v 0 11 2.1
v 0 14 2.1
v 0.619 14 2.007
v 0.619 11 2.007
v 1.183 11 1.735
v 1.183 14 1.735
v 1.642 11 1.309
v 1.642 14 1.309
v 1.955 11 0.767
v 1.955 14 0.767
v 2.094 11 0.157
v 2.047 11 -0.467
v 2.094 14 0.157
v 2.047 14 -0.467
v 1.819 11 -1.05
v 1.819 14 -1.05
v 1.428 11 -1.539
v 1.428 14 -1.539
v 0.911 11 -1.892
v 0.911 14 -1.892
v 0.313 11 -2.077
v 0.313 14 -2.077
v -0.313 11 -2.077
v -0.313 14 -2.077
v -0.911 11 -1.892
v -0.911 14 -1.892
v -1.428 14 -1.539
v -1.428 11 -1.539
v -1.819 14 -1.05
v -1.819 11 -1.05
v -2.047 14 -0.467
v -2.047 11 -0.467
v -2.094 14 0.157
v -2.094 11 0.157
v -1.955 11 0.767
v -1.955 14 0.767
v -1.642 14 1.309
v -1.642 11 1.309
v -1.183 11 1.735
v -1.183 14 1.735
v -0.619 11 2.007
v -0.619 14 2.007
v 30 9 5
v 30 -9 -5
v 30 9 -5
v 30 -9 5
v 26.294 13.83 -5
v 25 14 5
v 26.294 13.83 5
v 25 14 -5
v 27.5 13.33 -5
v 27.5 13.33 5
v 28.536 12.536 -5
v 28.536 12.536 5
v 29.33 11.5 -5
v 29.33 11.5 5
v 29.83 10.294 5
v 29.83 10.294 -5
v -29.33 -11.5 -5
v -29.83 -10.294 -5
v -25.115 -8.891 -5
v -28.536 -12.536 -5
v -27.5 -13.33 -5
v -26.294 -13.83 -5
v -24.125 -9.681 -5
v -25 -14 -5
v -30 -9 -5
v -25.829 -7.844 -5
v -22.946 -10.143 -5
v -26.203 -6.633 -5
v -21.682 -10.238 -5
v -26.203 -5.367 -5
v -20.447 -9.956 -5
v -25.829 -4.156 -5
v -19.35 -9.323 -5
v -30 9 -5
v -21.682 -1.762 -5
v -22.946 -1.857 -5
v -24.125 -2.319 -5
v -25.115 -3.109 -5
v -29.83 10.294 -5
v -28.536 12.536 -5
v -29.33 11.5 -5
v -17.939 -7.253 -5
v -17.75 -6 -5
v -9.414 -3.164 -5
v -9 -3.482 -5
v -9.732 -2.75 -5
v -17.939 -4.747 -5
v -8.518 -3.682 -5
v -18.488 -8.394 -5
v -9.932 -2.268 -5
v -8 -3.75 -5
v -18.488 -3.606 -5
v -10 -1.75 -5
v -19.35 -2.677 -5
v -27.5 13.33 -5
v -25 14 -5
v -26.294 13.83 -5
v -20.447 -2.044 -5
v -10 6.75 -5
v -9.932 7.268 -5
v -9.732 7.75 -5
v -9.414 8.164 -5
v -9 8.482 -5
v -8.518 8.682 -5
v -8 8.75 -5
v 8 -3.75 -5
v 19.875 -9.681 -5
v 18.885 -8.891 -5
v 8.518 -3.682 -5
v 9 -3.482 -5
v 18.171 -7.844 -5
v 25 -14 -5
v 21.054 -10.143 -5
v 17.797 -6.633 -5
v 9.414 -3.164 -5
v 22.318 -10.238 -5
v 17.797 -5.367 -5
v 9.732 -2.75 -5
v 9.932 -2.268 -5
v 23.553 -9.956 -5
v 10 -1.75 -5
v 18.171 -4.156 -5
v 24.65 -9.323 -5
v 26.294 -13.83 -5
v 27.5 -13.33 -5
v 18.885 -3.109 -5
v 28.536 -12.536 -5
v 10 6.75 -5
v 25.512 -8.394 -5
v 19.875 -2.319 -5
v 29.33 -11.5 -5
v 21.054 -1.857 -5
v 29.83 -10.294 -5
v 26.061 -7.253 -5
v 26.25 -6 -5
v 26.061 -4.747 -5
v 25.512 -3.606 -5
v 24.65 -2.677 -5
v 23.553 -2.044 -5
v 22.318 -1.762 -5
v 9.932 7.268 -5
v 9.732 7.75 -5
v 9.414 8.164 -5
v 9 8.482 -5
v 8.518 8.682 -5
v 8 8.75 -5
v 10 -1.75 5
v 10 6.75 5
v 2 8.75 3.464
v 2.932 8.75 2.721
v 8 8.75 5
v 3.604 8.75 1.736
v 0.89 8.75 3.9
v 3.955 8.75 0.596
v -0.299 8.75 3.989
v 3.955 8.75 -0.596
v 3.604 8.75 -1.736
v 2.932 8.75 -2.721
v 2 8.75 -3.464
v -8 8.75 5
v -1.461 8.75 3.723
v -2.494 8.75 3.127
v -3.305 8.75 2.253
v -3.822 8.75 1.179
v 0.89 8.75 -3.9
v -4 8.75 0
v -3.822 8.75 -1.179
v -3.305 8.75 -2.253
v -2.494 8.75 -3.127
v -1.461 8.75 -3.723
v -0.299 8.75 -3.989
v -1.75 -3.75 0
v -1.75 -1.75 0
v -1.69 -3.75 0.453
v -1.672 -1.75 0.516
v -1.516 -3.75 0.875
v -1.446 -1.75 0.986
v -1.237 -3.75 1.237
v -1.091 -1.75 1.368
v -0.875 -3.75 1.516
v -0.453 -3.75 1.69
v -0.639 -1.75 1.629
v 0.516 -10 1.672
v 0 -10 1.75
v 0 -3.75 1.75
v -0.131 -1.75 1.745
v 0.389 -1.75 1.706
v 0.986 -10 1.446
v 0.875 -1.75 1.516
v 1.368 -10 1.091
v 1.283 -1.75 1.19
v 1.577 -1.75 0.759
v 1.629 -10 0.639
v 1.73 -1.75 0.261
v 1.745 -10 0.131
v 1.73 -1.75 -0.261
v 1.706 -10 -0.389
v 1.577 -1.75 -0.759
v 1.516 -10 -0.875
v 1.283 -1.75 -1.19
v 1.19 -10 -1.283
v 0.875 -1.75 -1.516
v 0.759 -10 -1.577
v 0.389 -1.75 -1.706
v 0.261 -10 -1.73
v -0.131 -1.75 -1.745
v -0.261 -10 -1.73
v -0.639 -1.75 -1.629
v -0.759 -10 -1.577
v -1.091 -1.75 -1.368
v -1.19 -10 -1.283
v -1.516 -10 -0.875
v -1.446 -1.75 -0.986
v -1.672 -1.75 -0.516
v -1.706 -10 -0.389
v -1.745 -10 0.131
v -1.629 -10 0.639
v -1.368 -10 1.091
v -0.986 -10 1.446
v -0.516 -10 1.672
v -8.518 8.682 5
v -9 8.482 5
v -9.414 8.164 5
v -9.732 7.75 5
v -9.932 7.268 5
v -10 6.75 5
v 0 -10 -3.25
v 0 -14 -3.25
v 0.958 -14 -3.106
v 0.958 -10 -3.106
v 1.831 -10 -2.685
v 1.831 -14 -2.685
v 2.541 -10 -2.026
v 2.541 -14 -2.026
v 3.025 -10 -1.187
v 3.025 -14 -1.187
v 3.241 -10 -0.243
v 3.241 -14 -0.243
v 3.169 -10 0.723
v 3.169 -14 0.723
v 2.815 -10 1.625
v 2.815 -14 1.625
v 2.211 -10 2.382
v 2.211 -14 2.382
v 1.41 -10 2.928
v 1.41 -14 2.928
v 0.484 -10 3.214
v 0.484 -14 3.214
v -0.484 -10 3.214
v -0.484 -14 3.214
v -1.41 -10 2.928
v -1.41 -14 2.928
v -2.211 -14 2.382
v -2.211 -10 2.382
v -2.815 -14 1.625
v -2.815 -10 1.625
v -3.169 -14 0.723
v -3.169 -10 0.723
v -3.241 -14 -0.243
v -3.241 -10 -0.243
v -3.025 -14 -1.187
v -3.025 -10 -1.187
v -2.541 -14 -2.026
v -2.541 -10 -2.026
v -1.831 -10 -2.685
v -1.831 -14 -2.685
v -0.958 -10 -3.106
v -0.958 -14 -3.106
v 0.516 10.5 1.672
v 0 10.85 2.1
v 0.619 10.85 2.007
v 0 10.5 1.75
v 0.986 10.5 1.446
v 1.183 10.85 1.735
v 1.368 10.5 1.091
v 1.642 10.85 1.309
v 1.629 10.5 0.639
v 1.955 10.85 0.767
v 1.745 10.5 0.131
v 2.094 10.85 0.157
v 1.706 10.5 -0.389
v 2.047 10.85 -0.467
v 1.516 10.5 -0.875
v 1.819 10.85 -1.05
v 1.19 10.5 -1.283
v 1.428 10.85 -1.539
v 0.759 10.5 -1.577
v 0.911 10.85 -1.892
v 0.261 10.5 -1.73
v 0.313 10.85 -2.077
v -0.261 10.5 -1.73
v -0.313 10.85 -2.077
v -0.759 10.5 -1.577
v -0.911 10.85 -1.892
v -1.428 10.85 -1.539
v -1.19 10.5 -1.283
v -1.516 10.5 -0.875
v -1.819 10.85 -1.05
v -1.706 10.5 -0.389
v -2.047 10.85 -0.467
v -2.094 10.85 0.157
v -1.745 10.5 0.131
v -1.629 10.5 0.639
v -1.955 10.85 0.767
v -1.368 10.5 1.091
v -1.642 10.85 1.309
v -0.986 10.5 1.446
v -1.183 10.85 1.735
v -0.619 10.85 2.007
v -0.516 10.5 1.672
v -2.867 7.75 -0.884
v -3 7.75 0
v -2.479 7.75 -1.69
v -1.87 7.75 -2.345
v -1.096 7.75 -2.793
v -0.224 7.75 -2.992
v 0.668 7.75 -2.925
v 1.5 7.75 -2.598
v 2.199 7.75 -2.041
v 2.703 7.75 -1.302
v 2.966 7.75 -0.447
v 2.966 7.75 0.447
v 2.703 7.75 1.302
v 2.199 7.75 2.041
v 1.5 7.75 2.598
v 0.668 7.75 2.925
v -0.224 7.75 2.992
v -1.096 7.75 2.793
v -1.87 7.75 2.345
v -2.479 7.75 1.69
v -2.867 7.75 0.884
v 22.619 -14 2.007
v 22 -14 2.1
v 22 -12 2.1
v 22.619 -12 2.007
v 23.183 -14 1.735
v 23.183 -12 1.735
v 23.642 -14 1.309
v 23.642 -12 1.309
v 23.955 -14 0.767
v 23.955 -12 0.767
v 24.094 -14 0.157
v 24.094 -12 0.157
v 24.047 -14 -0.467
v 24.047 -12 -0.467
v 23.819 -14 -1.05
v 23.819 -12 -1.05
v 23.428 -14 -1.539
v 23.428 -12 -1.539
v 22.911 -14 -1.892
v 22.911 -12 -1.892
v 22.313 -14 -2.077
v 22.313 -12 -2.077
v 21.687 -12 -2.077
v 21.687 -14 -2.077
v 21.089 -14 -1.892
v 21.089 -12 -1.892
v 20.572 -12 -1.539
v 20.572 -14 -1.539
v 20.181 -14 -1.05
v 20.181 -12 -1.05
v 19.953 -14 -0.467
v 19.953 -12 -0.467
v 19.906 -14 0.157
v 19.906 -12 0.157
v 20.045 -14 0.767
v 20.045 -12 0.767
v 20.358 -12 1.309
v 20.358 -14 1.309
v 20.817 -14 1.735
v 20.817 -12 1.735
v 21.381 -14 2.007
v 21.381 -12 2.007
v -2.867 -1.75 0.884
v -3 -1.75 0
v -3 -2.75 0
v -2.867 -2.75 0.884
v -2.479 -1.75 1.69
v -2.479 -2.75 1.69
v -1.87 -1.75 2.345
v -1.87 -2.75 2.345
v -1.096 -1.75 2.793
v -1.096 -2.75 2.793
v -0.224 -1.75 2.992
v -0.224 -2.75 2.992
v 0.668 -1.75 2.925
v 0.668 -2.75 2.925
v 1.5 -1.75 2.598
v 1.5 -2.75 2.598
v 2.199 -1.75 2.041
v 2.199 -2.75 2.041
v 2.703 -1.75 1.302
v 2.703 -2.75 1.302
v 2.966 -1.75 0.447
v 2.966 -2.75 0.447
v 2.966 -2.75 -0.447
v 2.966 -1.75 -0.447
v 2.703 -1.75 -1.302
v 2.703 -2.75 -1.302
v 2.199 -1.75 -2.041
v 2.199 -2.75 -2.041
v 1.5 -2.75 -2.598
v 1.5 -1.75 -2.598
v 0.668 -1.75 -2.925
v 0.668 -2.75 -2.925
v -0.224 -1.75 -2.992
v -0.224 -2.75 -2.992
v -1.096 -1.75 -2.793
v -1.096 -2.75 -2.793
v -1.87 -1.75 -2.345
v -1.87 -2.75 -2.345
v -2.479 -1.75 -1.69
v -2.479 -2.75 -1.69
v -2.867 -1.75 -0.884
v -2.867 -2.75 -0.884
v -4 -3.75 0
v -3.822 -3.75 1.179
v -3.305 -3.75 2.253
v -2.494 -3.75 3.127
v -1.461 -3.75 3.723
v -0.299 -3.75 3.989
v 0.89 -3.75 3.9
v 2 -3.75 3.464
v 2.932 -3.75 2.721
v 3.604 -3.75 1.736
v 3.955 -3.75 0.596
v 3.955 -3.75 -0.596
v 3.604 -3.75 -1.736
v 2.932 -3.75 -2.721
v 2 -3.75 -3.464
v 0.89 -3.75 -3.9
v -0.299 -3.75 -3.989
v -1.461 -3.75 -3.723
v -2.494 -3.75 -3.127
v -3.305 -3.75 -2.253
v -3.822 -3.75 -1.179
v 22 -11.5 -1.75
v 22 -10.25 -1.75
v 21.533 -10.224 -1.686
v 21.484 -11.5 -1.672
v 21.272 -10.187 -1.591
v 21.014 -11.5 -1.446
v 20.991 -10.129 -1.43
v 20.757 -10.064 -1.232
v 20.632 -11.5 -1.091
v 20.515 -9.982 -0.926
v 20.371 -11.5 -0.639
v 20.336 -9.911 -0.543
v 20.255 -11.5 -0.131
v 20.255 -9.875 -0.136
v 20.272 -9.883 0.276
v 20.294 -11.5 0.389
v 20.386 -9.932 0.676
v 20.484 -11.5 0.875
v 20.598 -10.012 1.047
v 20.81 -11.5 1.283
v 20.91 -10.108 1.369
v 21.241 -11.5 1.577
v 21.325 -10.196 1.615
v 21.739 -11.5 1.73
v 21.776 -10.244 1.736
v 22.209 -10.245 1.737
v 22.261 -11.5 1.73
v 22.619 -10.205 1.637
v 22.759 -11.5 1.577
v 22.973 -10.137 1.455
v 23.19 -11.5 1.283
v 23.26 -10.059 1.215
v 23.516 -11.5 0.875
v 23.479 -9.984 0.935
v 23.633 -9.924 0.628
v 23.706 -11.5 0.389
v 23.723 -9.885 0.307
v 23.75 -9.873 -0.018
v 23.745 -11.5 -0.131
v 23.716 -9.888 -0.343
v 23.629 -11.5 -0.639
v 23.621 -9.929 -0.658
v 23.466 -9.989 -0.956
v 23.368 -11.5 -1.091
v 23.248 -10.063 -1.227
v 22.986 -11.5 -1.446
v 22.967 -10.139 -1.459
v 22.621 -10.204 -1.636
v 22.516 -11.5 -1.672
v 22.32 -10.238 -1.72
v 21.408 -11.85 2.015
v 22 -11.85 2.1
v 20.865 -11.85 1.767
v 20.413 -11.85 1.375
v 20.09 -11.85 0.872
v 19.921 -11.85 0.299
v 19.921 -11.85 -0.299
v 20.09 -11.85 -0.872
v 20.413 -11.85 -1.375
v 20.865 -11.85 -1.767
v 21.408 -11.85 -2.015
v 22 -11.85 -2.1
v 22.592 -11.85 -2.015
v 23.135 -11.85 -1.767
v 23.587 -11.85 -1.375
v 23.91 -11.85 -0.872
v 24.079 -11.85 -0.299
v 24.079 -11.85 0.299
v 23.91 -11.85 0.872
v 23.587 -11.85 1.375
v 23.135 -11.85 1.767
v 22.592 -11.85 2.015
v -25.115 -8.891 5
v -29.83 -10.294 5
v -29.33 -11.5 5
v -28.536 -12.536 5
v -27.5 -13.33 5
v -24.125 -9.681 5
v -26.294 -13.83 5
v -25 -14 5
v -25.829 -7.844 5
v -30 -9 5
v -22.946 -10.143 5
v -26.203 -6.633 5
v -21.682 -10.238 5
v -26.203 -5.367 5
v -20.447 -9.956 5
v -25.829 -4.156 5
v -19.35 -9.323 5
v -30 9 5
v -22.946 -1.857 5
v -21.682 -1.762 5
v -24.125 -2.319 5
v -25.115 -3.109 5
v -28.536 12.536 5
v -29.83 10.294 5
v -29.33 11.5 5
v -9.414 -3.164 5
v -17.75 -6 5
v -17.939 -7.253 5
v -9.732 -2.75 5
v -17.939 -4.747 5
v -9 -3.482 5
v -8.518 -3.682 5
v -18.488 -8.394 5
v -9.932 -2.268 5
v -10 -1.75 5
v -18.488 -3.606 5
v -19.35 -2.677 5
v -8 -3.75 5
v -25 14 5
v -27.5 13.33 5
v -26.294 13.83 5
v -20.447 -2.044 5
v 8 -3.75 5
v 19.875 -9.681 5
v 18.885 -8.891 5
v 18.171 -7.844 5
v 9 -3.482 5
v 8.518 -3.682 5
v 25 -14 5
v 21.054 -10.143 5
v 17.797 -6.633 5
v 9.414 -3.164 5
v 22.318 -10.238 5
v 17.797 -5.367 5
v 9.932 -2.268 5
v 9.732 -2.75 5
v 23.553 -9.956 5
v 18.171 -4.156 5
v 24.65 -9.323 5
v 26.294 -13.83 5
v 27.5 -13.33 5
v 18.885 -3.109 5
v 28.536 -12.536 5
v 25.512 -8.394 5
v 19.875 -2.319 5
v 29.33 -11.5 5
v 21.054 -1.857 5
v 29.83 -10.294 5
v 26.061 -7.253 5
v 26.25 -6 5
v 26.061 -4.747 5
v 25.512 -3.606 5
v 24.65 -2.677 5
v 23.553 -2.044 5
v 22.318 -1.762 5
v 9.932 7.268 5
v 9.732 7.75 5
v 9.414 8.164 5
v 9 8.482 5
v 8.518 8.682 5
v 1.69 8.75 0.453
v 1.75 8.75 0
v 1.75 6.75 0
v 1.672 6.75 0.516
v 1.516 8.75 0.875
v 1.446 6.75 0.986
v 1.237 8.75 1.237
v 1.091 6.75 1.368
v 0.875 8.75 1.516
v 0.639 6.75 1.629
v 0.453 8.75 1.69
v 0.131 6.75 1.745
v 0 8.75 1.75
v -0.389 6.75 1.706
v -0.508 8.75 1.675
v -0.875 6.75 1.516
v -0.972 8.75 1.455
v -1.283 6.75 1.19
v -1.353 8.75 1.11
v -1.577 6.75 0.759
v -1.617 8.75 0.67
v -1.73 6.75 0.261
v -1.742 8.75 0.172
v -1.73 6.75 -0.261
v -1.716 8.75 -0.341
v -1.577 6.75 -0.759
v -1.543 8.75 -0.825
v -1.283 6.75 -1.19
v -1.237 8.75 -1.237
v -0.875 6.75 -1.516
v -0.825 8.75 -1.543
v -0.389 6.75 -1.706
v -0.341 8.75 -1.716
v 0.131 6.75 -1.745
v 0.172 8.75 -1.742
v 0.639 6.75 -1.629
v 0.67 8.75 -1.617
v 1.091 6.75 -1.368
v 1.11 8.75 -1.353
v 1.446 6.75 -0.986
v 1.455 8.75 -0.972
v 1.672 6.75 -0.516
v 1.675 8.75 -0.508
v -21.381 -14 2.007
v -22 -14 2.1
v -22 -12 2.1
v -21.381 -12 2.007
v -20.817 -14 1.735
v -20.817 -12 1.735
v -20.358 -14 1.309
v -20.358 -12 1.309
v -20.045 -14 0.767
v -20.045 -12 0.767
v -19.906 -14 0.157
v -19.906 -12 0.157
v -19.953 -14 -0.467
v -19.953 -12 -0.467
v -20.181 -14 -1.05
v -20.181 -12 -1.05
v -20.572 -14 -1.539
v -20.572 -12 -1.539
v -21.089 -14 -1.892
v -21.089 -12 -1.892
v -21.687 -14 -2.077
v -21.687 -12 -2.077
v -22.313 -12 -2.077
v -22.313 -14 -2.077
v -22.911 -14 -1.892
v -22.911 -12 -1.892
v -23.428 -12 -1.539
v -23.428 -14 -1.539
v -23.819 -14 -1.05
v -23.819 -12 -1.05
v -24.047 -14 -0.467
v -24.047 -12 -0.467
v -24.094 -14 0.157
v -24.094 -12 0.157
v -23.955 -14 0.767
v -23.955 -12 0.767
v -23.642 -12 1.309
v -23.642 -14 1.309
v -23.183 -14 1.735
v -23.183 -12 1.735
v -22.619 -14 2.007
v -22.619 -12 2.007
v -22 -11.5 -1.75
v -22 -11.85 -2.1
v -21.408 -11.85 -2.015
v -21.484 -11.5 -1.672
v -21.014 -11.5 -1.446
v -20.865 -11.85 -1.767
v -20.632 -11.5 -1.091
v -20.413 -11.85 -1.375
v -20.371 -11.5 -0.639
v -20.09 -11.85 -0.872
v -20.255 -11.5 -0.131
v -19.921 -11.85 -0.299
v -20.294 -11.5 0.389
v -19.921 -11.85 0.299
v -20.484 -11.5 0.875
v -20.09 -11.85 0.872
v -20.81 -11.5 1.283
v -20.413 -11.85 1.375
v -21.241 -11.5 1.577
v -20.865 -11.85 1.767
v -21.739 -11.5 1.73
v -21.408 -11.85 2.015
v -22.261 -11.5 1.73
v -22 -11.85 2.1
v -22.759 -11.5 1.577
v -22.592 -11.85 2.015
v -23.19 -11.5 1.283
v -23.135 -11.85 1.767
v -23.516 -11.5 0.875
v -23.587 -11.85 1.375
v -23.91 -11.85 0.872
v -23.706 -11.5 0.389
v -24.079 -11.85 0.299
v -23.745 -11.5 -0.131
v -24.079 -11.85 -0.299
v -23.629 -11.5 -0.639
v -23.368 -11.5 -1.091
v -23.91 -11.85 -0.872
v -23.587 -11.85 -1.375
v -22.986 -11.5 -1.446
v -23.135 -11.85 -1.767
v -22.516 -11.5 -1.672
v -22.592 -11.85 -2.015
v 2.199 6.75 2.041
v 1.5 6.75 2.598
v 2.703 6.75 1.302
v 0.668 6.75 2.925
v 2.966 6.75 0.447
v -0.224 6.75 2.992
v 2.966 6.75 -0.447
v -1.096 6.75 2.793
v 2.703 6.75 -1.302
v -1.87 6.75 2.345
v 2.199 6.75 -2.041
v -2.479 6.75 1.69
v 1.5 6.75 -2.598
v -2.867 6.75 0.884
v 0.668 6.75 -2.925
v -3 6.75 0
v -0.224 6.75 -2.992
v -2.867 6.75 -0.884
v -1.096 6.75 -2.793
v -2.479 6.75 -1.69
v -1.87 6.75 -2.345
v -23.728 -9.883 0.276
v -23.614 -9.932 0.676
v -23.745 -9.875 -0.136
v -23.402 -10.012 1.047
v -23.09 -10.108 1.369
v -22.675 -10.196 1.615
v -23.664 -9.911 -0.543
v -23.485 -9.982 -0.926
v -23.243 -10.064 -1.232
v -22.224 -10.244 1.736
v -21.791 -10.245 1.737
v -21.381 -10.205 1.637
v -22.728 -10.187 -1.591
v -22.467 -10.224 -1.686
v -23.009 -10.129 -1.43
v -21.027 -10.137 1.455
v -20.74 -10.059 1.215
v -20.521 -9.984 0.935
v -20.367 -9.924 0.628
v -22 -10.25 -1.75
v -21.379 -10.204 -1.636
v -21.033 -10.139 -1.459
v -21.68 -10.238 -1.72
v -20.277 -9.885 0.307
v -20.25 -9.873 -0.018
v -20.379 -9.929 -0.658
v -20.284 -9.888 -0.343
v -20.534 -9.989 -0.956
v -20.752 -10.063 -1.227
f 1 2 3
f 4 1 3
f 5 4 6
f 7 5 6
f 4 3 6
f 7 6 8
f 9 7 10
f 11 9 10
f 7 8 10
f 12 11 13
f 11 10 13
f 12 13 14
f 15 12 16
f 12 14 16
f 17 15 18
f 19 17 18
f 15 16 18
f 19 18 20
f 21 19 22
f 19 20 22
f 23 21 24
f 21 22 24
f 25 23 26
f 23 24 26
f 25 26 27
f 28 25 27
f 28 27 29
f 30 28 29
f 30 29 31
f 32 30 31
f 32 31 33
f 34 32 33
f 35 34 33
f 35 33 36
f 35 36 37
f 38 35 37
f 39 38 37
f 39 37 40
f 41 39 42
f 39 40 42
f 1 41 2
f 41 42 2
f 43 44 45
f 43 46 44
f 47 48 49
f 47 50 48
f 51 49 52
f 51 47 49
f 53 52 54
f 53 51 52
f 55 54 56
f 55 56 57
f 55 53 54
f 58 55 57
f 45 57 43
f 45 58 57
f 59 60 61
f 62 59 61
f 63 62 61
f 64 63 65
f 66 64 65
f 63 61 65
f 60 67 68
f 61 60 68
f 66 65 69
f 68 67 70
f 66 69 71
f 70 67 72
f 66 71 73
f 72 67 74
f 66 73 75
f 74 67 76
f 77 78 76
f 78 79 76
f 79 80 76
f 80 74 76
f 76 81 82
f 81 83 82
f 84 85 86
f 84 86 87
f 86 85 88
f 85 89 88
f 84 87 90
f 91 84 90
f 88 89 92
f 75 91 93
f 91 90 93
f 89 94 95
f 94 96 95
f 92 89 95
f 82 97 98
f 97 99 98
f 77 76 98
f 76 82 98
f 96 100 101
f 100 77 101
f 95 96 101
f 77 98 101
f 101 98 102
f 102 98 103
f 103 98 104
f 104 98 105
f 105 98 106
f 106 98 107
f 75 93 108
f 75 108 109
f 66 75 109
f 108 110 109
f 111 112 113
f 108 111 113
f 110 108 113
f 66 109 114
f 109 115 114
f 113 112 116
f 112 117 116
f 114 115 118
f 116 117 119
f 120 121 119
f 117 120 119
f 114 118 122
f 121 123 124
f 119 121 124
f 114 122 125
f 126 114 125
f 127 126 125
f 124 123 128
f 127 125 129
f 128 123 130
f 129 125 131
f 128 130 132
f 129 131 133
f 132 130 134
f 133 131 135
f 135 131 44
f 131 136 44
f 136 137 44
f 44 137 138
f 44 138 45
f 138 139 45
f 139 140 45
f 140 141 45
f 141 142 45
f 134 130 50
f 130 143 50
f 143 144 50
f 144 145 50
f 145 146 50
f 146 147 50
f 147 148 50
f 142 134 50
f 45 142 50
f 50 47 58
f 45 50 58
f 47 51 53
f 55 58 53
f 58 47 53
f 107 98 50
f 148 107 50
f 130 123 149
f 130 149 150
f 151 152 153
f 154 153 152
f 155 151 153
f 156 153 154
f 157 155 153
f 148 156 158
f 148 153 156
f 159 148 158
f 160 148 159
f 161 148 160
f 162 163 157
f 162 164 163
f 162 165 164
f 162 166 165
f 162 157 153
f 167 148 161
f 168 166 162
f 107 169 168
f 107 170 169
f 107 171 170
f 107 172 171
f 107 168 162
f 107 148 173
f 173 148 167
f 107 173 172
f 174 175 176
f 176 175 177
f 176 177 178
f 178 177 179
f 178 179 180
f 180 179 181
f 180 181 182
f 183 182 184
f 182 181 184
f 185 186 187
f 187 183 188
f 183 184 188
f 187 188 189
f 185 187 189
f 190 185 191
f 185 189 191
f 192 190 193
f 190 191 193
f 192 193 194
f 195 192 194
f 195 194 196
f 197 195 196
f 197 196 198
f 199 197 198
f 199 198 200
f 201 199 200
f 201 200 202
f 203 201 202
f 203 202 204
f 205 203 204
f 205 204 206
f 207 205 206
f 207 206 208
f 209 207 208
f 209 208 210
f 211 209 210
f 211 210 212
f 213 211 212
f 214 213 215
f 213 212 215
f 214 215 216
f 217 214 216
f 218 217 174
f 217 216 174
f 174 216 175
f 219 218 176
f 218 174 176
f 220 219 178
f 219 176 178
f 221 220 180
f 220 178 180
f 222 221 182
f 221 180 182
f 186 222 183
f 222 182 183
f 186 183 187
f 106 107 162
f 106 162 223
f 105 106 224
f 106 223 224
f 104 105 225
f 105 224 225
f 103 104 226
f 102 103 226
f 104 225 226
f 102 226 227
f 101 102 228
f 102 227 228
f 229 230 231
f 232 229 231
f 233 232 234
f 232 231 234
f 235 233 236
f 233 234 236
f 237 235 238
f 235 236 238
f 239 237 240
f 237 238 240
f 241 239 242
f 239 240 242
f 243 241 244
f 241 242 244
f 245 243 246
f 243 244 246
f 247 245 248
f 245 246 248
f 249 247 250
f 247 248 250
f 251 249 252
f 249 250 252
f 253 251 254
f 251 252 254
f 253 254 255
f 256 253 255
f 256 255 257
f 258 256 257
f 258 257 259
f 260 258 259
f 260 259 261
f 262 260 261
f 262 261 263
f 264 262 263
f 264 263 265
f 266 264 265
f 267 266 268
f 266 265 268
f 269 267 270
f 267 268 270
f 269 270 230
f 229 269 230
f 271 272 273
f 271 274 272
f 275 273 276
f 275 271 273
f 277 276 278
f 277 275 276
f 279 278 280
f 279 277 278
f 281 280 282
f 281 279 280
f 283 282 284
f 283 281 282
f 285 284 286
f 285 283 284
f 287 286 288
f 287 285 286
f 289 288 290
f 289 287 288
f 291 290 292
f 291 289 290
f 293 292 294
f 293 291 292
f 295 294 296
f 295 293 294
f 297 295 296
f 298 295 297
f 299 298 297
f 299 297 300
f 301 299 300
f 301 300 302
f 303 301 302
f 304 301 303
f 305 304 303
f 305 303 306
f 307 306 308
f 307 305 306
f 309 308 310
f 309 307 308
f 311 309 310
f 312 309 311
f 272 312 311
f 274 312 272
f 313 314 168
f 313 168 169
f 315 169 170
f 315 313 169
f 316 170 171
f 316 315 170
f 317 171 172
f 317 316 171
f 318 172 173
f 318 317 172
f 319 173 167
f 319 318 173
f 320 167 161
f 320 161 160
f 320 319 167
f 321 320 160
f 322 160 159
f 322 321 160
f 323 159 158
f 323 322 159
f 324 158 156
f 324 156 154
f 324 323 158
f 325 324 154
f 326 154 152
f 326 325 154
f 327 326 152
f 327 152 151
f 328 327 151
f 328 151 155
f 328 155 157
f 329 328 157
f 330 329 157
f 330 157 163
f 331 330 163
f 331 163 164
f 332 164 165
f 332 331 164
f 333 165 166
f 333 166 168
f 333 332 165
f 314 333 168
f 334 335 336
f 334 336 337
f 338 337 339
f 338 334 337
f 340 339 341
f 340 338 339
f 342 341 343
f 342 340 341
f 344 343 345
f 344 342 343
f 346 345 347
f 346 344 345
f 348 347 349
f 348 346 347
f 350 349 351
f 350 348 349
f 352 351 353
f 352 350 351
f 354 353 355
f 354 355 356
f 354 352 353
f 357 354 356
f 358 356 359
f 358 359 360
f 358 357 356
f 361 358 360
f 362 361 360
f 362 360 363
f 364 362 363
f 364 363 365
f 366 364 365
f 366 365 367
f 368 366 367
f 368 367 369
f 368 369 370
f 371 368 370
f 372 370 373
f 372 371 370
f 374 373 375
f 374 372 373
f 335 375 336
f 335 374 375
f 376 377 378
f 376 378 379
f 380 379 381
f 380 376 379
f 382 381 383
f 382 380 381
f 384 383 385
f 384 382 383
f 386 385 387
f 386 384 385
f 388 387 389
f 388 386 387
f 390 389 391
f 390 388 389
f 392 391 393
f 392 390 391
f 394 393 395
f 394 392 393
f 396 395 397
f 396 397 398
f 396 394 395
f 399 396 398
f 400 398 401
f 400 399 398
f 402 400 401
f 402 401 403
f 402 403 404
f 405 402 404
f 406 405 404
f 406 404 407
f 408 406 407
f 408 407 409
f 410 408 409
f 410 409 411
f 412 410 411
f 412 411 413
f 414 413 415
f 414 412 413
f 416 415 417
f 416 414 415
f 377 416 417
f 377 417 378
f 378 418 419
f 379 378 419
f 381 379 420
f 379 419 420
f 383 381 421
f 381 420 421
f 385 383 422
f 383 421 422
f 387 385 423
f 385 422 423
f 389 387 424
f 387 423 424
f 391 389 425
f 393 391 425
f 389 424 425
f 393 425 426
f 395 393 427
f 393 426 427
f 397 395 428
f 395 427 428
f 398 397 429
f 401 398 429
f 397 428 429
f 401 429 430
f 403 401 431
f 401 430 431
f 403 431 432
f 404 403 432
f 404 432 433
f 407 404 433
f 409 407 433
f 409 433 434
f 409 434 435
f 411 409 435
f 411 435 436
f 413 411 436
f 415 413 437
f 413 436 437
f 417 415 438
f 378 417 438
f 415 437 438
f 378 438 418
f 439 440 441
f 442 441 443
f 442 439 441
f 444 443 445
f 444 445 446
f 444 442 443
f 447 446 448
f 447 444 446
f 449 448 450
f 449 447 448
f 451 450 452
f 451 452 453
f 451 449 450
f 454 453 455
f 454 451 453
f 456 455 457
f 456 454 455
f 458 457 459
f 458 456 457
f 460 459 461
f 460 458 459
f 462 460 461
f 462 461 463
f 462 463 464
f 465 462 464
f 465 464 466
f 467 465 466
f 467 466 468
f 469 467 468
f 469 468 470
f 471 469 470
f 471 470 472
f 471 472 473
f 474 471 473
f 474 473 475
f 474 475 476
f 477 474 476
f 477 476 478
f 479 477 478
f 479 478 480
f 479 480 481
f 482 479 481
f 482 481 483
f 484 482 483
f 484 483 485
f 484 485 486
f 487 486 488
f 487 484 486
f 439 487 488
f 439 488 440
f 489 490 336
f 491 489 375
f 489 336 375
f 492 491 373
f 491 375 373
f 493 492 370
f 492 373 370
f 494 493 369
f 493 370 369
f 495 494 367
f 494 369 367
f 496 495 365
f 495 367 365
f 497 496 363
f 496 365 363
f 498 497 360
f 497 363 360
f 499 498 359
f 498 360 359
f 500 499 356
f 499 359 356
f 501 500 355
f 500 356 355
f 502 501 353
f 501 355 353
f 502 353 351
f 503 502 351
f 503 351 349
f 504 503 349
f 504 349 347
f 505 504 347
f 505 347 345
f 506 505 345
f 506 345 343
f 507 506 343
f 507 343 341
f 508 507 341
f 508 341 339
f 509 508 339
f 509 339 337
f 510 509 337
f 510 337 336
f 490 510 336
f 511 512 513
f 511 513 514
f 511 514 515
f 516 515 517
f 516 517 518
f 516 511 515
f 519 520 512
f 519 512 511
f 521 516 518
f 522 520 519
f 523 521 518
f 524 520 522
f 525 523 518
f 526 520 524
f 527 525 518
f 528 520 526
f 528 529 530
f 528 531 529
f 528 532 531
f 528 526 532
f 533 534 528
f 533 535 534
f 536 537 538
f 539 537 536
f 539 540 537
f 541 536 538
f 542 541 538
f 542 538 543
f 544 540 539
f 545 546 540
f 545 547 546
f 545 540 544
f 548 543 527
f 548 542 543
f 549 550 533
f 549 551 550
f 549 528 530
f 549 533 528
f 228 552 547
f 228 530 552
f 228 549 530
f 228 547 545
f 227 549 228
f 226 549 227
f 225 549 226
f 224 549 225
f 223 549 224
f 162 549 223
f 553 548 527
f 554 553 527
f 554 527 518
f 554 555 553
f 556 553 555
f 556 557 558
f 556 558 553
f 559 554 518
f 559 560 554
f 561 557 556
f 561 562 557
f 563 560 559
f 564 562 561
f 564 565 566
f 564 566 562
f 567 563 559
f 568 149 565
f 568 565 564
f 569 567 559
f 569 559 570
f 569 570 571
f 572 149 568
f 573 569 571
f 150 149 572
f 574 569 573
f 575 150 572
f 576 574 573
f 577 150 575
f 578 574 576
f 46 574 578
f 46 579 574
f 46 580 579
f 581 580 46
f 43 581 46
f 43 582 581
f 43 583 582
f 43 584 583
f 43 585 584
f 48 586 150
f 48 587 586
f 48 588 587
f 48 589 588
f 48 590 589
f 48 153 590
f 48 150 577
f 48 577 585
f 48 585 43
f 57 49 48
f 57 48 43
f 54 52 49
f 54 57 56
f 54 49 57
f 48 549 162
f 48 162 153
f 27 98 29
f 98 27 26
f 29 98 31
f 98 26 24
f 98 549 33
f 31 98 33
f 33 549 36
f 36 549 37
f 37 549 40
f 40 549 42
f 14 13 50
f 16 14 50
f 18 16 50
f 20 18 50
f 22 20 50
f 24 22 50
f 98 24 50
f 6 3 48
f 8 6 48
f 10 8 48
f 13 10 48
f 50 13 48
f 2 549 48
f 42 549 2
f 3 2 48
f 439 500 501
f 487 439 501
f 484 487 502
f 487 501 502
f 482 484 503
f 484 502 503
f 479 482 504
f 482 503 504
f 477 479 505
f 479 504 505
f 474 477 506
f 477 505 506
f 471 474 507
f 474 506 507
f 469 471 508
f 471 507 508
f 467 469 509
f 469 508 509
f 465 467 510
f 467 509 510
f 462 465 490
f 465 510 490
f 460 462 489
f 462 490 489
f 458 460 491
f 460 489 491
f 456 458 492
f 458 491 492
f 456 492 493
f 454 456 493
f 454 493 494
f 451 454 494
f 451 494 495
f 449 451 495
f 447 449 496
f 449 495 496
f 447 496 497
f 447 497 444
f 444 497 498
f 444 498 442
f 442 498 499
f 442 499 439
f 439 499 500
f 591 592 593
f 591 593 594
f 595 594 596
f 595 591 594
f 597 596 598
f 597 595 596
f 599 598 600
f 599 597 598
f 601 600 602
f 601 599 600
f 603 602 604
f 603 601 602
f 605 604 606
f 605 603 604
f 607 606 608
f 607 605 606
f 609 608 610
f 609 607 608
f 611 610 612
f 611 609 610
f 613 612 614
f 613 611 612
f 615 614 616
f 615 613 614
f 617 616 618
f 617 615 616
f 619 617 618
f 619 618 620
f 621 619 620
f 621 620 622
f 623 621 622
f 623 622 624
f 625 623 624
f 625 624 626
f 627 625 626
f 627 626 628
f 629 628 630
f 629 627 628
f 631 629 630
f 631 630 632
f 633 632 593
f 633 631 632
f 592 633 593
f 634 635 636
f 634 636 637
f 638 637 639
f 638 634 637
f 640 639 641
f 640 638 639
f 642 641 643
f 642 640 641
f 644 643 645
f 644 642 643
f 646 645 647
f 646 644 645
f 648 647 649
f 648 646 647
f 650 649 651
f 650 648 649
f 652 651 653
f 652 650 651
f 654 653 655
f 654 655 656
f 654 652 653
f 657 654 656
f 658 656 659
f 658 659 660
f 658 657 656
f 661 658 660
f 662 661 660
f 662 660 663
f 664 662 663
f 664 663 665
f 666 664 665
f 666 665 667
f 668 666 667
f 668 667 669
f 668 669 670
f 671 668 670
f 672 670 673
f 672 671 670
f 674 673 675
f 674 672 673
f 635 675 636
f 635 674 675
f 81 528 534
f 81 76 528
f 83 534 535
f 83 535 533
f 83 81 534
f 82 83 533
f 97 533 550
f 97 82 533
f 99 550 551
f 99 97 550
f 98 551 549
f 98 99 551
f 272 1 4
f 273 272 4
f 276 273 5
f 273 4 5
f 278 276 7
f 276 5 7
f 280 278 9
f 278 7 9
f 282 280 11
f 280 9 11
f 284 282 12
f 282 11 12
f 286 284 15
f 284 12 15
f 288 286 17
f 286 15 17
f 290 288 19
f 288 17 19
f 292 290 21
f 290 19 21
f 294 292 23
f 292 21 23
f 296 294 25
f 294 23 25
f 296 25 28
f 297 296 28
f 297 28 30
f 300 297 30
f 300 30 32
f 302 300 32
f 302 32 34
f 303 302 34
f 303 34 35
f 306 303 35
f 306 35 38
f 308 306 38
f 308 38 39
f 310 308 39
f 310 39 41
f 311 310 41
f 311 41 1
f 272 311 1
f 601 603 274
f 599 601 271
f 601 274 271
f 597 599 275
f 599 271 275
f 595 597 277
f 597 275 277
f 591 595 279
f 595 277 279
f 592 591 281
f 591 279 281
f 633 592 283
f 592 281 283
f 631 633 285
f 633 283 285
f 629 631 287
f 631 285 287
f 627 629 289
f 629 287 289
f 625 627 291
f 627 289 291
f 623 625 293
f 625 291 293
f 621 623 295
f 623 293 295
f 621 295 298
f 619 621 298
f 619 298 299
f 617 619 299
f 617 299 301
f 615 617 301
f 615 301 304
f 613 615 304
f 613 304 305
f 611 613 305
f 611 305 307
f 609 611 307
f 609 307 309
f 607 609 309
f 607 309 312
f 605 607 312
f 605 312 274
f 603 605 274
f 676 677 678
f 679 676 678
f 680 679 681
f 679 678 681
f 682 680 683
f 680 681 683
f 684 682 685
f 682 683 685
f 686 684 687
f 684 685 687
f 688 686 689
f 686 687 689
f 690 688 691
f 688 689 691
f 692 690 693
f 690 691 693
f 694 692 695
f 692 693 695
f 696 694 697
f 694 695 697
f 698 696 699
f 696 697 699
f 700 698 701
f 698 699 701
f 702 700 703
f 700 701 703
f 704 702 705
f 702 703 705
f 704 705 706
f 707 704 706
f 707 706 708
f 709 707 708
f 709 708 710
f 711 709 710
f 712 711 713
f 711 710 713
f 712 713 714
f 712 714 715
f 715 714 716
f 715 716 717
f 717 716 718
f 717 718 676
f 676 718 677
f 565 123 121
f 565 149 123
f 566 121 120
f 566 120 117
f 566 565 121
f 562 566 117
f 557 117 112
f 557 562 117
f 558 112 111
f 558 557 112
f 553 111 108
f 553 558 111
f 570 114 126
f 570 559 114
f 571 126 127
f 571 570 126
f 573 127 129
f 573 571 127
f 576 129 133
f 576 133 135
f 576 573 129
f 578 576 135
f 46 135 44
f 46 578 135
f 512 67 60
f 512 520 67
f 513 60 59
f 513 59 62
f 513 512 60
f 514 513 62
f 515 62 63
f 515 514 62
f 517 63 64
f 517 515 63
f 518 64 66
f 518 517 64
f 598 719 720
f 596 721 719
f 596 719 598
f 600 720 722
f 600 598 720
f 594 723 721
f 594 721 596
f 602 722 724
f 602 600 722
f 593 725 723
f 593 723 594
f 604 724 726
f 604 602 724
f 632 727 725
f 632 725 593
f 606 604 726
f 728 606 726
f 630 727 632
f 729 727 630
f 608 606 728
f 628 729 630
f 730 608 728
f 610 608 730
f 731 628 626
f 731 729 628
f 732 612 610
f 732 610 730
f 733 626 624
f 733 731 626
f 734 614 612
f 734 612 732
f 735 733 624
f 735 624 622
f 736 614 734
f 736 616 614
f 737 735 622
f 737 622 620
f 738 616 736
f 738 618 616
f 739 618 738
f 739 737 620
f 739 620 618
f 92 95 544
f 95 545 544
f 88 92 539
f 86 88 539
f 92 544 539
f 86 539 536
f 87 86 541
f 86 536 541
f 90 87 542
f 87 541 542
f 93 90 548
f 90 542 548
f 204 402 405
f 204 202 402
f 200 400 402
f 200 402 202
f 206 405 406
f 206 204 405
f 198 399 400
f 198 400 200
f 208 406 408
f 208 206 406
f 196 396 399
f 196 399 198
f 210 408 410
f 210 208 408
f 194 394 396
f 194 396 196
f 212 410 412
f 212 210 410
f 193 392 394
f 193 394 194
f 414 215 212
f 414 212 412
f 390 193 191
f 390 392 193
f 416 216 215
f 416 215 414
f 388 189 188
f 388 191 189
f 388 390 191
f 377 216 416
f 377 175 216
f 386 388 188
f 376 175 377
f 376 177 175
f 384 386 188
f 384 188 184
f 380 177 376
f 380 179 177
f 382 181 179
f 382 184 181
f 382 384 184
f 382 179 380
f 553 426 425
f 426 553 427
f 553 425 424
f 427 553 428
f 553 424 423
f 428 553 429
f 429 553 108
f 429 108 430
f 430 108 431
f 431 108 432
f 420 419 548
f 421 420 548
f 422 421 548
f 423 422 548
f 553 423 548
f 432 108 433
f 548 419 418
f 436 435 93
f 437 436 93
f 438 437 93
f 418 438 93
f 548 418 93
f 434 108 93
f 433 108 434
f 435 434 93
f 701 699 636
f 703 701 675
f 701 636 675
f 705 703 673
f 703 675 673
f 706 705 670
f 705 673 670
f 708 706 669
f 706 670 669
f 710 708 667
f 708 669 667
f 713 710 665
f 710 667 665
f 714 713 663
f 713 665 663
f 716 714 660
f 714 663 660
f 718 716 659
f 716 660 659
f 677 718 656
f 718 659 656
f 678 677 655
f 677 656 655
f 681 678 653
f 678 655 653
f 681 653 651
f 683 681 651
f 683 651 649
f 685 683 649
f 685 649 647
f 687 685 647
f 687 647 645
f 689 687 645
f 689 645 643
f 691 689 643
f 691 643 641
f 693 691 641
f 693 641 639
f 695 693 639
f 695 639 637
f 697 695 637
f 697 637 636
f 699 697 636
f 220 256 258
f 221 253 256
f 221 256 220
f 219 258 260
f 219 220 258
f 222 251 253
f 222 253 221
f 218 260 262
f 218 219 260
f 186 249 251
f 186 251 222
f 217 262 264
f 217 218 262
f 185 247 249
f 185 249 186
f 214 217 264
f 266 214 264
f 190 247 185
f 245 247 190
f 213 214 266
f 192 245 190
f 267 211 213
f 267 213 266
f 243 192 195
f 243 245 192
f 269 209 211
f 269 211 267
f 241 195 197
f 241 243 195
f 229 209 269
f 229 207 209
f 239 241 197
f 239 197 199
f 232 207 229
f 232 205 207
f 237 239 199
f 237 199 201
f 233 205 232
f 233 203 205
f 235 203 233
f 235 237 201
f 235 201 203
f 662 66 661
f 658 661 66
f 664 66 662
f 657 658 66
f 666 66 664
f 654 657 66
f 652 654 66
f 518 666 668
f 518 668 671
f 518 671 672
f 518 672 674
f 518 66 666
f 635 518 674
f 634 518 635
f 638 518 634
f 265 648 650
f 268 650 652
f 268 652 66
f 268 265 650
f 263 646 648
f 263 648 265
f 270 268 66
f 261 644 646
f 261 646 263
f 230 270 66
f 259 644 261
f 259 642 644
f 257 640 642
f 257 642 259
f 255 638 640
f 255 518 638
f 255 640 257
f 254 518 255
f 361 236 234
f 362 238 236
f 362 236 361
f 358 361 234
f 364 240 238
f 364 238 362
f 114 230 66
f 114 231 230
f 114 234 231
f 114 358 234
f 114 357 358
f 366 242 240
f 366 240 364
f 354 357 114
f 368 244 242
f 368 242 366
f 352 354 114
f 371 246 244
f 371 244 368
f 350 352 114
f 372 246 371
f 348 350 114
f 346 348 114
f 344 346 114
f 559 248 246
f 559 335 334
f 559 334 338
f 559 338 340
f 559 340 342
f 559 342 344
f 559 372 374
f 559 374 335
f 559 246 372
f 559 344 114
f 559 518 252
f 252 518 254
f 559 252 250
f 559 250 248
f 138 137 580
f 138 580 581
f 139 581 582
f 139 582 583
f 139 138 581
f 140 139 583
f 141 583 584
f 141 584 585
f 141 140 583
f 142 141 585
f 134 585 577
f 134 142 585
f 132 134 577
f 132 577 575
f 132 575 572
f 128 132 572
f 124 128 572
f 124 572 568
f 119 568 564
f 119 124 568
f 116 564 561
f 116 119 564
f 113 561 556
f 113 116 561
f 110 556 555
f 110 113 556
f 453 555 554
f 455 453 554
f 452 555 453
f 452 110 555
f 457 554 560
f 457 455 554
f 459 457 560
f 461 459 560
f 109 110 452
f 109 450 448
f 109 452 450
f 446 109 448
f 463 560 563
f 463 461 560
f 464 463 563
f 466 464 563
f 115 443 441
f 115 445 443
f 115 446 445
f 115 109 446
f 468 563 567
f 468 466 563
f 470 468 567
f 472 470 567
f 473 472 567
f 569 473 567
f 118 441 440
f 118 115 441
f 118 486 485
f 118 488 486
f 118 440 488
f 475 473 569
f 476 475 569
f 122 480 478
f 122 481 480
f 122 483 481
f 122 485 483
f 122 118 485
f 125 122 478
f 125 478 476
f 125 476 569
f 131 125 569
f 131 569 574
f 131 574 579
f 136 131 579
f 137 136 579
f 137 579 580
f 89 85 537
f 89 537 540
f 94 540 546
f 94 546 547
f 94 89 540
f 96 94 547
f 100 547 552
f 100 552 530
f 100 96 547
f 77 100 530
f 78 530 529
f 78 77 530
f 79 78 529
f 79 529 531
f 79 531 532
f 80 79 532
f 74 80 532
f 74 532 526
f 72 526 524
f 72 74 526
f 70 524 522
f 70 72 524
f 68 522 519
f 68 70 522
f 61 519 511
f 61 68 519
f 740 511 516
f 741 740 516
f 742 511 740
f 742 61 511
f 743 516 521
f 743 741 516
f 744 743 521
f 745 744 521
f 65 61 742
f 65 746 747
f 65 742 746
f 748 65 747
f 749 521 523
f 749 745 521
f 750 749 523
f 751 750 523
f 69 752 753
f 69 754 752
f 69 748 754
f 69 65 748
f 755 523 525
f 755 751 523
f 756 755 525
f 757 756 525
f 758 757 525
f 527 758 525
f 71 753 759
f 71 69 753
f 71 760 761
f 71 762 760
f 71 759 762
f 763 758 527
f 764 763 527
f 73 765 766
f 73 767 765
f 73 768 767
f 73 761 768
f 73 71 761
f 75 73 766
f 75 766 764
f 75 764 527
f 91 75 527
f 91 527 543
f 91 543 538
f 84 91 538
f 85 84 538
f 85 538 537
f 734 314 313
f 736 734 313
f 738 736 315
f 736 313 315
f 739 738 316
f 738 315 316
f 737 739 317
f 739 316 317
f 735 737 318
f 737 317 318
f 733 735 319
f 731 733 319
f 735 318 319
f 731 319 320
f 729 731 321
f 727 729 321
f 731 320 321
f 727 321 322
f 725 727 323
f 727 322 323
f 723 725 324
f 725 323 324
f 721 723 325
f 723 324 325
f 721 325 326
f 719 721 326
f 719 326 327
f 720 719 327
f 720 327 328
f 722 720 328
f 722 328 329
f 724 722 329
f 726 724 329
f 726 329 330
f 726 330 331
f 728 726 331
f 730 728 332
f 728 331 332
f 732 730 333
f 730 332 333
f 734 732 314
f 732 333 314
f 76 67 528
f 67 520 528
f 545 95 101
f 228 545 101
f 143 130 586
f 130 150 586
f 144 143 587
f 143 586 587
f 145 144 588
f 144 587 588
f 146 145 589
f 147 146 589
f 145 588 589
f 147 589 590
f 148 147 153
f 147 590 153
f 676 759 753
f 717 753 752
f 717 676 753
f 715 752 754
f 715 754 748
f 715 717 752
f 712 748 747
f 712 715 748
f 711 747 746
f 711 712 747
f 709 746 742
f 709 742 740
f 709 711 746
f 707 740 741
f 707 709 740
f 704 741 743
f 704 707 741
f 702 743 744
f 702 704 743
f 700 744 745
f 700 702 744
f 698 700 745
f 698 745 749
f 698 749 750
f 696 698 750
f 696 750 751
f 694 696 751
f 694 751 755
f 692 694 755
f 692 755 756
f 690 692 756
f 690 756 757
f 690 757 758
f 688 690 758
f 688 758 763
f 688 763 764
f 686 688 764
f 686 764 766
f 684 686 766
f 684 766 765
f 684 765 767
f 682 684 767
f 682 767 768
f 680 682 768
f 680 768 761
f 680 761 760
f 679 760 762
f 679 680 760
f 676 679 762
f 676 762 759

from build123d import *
from build123d.topology import SkipClean

# Parameters (mm, degrees)
SKETCH1_W           = 60
SKETCH1_H           = 28
SKETCH1_R           = 4.25
BOSS_EXTRUDE1_DEPTH = 5
SKETCH2_W           = 20
SKETCH2_H           = 12.5
CUT_EXTRUDE1_DEPTH  = 35.583232932
SKETCH3_R           = 1.75
CUT_EXTRUDE2_DEPTH  = 30
CUT_EXTRUDE3_REACH  = 43.34
SKETCH4_R           = 1.75
FILLET1_R           = 5
FILLET2_R           = 2
SKETCH5_R           = 3.25
CUT_EXTRUDE4_DEPTH  = 4
SKETCH6_R           = 2.1
CUT_EXTRUDE5_DEPTH  = 2
SKETCH7_R           = 3
SKETCH7_R_2         = 1.75
BOSS_EXTRUDE2_DEPTH = 2
BOSS_EXTRUDE3_START = 2
SKETCH8_R           = 3
SKETCH8_R_2         = 1.75
BOSS_EXTRUDE3_DEPTH = 2
SKETCH9_R           = 2.1
CUT_EXTRUDE6_DEPTH  = 3
CHAMFER1_SIZE       = 0.5
CHAMFER2_SIZE       = 1


with BuildPart() as part:
    # Sketch1 → Boss-Extrude1 (new, symmetric)
    with BuildSketch(Plane.XY):
        Rectangle(SKETCH1_W, SKETCH1_H)
        with Locations((-22, -6)):
            Circle(SKETCH1_R, mode=Mode.SUBTRACT)
        with Locations((22, -6)):
            Circle(SKETCH1_R, mode=Mode.SUBTRACT)
    extrude(amount=BOSS_EXTRUDE1_DEPTH, both=True)

    # Sketch2 → Cut-Extrude1 (cut, through all)
    with BuildSketch(Plane(origin=(0, 0, -5), x_dir=(-1, 0, 0), z_dir=(0, 0, -1))):
        with Locations((0, 2.5)):
            Rectangle(SKETCH2_W, SKETCH2_H)
    extrude(amount=-CUT_EXTRUDE1_DEPTH, mode=Mode.SUBTRACT)

    # Sketch3 → Cut-Extrude2 (cut)
    with BuildSketch(Plane(origin=(0, 14, 0), x_dir=(1, 0, 0), z_dir=(0, 1, 0))):
        with Locations(Location((0, 0, 0), (0, 0, 270))):
            Circle(SKETCH3_R)
    extrude(amount=-CUT_EXTRUDE2_DEPTH, mode=Mode.SUBTRACT)

    # Sketch4 → Cut-Extrude3 (cut, up to next)
    with BuildSketch(Plane(origin=(0, -14, 0), x_dir=(1, 0, 0), z_dir=(0, 1, 0)), mode=Mode.PRIVATE) as cut_extrude3_sk1:
        with Locations(Location((-22, 0, 0), (0, 0, 90))):
            Circle(SKETCH4_R)
    cut_extrude3_tool1 = extrude(cut_extrude3_sk1.sketch, amount=CUT_EXTRUDE3_REACH, mode=Mode.PRIVATE) & part.part
    # Sketch4 → Cut-Extrude3 (cut, up to next)
    with BuildSketch(Plane(origin=(0, -14, 0), x_dir=(1, 0, 0), z_dir=(0, 1, 0)), mode=Mode.PRIVATE) as cut_extrude3_sk2:
        with Locations(Location((22, 0, 0), (0, 0, 90))):
            Circle(SKETCH4_R)
    cut_extrude3_tool2 = extrude(cut_extrude3_sk2.sketch, amount=CUT_EXTRUDE3_REACH, mode=Mode.PRIVATE) & part.part
    add(cut_extrude3_tool1.solids().sort_by_distance((-22, -14, 0))[0], mode=Mode.SUBTRACT)
    add(cut_extrude3_tool2.solids().sort_by_distance((22, -14, 0))[0], mode=Mode.SUBTRACT)

    # Fillet1
    fillet1_edges = [part.edges().sort_by_distance(p)[0] for p in [
        (-30, 14, 0),
        (30, 14, 0),
        (30, -14, 0),
        (-30, -14, 0),
    ]]
    fillet(fillet1_edges, radius=FILLET1_R)

    # Fillet2
    fillet2_edges = [part.edges().sort_by_distance(p)[0] for p in [
        (-10, 8.75, 0),
        (-10, -3.75, 0),
        (10, -3.75, 0),
        (10, 8.75, 0),
    ]]
    fillet(fillet2_edges, radius=FILLET2_R)

    # Sketch5 → Cut-Extrude4 (cut)
    with BuildSketch(Plane.XZ.offset(14)):
        with Locations(Location((0, 0, 0), (0, 0, 270))):
            Circle(SKETCH5_R)
    extrude(amount=-CUT_EXTRUDE4_DEPTH, mode=Mode.SUBTRACT)

    # Sketch6 → Cut-Extrude5 (cut)
    with BuildSketch(Plane(origin=(0, -14, 0), x_dir=(1, 0, 0), z_dir=(0, 1, 0))):
        with Locations(Location((-22, 0, 0), (0, 0, 270))):
            Circle(SKETCH6_R)
        with Locations(Location((22, 0, 0), (0, 0, 270))):
            Circle(SKETCH6_R)
    extrude(amount=CUT_EXTRUDE5_DEPTH, mode=Mode.SUBTRACT)

    # Sketch7 → Boss-Extrude2 (add)
    with SkipClean():  # the faces are left unmerged after this step: merging them gives an invalid solid
        with BuildSketch(Plane.XZ.offset(-8.75)):
            with Locations(Location((0, 0, 0), (0, 0, 180))):
                Circle(SKETCH7_R)
            Circle(SKETCH7_R_2, mode=Mode.SUBTRACT)
        extrude(amount=BOSS_EXTRUDE2_DEPTH)

    # Sketch8 → Boss-Extrude3 (add)
    with SkipClean():  # the faces are left unmerged after this step: merging them gives an invalid solid
        with BuildSketch(Plane(origin=(0, -3.75, 0), x_dir=(1, 0, 0), z_dir=(0, 1, 0)).offset(BOSS_EXTRUDE3_START)):
            with Locations(Location((0, 0, 0), (0, 0, 180))):
                Circle(SKETCH8_R)
            with Locations(Location((0, 0, 0), (0, 0, 180))):
                Circle(SKETCH8_R_2, mode=Mode.SUBTRACT)
        extrude(amount=-BOSS_EXTRUDE3_DEPTH)

    # Sketch9 → Cut-Extrude6 (cut)
    with SkipClean():  # the faces are left unmerged after this step: merging them gives an invalid solid
        with BuildSketch(Plane(origin=(0, 14, 0), x_dir=(1, 0, 0), z_dir=(0, 1, 0))):
            with Locations(Location((0, 0, 0), (0, 0, 270))):
                Circle(SKETCH9_R)
        extrude(amount=-CUT_EXTRUDE6_DEPTH, mode=Mode.SUBTRACT)

    # Chamfer1
    # the kernel refuses this chamfer: 0.5 mm, written as the material it takes off along each edge
    with BuildSketch(Plane(origin=(22, -12, 0), x_dir=(0, 0, -1), z_dir=(-1, 0, 0))) as chamfer1_piece_1_section:
        Polygon((1.75, -CHAMFER1_SIZE), (1.75 + CHAMFER1_SIZE, 0), (1.75, 0), align=None)
    chamfer1_piece_1 = revolve(axis=Axis((22, -12, 0), (0, -1, 0)), mode=Mode.PRIVATE)
    chamfer1_piece_1 = chamfer1_piece_1 & Plane(origin=(22, -11.675956313, 0), x_dir=(0, 0, 1), z_dir=(0, -1, 0)) * Cylinder(2.1, 9, mode=Mode.PRIVATE)
    add(chamfer1_piece_1, mode=Mode.SUBTRACT)
    with BuildSketch(Plane(origin=(-22, -12, 0), x_dir=(0, 0, -1), z_dir=(-1, 0, 0))) as chamfer1_piece_2_section:
        Polygon((1.75, -CHAMFER1_SIZE), (1.75 + CHAMFER1_SIZE, 0), (1.75, 0), align=None)
    chamfer1_piece_2 = revolve(axis=Axis((-22, -12, 0), (0, -1, 0)), mode=Mode.PRIVATE)
    chamfer1_piece_2 = chamfer1_piece_2 & Plane(origin=(-22, -11.675956313, 0), x_dir=(0, 0, 1), z_dir=(0, -1, 0)) * Cylinder(2.1, 9, mode=Mode.PRIVATE)
    add(chamfer1_piece_2, mode=Mode.SUBTRACT)
    with BuildSketch(Plane(origin=(0, 11, 0), x_dir=(0, 0, 1), z_dir=(-1, 0, 0))) as chamfer1_piece_3_section:
        Polygon((1.75 + CHAMFER1_SIZE, 0), (1.75, -CHAMFER1_SIZE), (1.75, 0), align=None)
    chamfer1_piece_3 = revolve(axis=Axis((0, 11, 0), (0, 1, 0)), mode=Mode.PRIVATE)
    chamfer1_piece_3 = chamfer1_piece_3 & Plane(origin=(0, 10.675956313, 0), x_dir=(0, 0, 1), z_dir=(0, 1, 0)) * Cylinder(2.1, 9, mode=Mode.PRIVATE)
    add(chamfer1_piece_3, mode=Mode.SUBTRACT)

    # Chamfer2
    chamfer2_edges = [part.edges().sort_by_distance(p)[0] for p in [
        (3, 8.75, 0),
        (3, -3.75, 0),
    ]]
    chamfer(chamfer2_edges, length=CHAMFER2_SIZE)


solid = part.part
